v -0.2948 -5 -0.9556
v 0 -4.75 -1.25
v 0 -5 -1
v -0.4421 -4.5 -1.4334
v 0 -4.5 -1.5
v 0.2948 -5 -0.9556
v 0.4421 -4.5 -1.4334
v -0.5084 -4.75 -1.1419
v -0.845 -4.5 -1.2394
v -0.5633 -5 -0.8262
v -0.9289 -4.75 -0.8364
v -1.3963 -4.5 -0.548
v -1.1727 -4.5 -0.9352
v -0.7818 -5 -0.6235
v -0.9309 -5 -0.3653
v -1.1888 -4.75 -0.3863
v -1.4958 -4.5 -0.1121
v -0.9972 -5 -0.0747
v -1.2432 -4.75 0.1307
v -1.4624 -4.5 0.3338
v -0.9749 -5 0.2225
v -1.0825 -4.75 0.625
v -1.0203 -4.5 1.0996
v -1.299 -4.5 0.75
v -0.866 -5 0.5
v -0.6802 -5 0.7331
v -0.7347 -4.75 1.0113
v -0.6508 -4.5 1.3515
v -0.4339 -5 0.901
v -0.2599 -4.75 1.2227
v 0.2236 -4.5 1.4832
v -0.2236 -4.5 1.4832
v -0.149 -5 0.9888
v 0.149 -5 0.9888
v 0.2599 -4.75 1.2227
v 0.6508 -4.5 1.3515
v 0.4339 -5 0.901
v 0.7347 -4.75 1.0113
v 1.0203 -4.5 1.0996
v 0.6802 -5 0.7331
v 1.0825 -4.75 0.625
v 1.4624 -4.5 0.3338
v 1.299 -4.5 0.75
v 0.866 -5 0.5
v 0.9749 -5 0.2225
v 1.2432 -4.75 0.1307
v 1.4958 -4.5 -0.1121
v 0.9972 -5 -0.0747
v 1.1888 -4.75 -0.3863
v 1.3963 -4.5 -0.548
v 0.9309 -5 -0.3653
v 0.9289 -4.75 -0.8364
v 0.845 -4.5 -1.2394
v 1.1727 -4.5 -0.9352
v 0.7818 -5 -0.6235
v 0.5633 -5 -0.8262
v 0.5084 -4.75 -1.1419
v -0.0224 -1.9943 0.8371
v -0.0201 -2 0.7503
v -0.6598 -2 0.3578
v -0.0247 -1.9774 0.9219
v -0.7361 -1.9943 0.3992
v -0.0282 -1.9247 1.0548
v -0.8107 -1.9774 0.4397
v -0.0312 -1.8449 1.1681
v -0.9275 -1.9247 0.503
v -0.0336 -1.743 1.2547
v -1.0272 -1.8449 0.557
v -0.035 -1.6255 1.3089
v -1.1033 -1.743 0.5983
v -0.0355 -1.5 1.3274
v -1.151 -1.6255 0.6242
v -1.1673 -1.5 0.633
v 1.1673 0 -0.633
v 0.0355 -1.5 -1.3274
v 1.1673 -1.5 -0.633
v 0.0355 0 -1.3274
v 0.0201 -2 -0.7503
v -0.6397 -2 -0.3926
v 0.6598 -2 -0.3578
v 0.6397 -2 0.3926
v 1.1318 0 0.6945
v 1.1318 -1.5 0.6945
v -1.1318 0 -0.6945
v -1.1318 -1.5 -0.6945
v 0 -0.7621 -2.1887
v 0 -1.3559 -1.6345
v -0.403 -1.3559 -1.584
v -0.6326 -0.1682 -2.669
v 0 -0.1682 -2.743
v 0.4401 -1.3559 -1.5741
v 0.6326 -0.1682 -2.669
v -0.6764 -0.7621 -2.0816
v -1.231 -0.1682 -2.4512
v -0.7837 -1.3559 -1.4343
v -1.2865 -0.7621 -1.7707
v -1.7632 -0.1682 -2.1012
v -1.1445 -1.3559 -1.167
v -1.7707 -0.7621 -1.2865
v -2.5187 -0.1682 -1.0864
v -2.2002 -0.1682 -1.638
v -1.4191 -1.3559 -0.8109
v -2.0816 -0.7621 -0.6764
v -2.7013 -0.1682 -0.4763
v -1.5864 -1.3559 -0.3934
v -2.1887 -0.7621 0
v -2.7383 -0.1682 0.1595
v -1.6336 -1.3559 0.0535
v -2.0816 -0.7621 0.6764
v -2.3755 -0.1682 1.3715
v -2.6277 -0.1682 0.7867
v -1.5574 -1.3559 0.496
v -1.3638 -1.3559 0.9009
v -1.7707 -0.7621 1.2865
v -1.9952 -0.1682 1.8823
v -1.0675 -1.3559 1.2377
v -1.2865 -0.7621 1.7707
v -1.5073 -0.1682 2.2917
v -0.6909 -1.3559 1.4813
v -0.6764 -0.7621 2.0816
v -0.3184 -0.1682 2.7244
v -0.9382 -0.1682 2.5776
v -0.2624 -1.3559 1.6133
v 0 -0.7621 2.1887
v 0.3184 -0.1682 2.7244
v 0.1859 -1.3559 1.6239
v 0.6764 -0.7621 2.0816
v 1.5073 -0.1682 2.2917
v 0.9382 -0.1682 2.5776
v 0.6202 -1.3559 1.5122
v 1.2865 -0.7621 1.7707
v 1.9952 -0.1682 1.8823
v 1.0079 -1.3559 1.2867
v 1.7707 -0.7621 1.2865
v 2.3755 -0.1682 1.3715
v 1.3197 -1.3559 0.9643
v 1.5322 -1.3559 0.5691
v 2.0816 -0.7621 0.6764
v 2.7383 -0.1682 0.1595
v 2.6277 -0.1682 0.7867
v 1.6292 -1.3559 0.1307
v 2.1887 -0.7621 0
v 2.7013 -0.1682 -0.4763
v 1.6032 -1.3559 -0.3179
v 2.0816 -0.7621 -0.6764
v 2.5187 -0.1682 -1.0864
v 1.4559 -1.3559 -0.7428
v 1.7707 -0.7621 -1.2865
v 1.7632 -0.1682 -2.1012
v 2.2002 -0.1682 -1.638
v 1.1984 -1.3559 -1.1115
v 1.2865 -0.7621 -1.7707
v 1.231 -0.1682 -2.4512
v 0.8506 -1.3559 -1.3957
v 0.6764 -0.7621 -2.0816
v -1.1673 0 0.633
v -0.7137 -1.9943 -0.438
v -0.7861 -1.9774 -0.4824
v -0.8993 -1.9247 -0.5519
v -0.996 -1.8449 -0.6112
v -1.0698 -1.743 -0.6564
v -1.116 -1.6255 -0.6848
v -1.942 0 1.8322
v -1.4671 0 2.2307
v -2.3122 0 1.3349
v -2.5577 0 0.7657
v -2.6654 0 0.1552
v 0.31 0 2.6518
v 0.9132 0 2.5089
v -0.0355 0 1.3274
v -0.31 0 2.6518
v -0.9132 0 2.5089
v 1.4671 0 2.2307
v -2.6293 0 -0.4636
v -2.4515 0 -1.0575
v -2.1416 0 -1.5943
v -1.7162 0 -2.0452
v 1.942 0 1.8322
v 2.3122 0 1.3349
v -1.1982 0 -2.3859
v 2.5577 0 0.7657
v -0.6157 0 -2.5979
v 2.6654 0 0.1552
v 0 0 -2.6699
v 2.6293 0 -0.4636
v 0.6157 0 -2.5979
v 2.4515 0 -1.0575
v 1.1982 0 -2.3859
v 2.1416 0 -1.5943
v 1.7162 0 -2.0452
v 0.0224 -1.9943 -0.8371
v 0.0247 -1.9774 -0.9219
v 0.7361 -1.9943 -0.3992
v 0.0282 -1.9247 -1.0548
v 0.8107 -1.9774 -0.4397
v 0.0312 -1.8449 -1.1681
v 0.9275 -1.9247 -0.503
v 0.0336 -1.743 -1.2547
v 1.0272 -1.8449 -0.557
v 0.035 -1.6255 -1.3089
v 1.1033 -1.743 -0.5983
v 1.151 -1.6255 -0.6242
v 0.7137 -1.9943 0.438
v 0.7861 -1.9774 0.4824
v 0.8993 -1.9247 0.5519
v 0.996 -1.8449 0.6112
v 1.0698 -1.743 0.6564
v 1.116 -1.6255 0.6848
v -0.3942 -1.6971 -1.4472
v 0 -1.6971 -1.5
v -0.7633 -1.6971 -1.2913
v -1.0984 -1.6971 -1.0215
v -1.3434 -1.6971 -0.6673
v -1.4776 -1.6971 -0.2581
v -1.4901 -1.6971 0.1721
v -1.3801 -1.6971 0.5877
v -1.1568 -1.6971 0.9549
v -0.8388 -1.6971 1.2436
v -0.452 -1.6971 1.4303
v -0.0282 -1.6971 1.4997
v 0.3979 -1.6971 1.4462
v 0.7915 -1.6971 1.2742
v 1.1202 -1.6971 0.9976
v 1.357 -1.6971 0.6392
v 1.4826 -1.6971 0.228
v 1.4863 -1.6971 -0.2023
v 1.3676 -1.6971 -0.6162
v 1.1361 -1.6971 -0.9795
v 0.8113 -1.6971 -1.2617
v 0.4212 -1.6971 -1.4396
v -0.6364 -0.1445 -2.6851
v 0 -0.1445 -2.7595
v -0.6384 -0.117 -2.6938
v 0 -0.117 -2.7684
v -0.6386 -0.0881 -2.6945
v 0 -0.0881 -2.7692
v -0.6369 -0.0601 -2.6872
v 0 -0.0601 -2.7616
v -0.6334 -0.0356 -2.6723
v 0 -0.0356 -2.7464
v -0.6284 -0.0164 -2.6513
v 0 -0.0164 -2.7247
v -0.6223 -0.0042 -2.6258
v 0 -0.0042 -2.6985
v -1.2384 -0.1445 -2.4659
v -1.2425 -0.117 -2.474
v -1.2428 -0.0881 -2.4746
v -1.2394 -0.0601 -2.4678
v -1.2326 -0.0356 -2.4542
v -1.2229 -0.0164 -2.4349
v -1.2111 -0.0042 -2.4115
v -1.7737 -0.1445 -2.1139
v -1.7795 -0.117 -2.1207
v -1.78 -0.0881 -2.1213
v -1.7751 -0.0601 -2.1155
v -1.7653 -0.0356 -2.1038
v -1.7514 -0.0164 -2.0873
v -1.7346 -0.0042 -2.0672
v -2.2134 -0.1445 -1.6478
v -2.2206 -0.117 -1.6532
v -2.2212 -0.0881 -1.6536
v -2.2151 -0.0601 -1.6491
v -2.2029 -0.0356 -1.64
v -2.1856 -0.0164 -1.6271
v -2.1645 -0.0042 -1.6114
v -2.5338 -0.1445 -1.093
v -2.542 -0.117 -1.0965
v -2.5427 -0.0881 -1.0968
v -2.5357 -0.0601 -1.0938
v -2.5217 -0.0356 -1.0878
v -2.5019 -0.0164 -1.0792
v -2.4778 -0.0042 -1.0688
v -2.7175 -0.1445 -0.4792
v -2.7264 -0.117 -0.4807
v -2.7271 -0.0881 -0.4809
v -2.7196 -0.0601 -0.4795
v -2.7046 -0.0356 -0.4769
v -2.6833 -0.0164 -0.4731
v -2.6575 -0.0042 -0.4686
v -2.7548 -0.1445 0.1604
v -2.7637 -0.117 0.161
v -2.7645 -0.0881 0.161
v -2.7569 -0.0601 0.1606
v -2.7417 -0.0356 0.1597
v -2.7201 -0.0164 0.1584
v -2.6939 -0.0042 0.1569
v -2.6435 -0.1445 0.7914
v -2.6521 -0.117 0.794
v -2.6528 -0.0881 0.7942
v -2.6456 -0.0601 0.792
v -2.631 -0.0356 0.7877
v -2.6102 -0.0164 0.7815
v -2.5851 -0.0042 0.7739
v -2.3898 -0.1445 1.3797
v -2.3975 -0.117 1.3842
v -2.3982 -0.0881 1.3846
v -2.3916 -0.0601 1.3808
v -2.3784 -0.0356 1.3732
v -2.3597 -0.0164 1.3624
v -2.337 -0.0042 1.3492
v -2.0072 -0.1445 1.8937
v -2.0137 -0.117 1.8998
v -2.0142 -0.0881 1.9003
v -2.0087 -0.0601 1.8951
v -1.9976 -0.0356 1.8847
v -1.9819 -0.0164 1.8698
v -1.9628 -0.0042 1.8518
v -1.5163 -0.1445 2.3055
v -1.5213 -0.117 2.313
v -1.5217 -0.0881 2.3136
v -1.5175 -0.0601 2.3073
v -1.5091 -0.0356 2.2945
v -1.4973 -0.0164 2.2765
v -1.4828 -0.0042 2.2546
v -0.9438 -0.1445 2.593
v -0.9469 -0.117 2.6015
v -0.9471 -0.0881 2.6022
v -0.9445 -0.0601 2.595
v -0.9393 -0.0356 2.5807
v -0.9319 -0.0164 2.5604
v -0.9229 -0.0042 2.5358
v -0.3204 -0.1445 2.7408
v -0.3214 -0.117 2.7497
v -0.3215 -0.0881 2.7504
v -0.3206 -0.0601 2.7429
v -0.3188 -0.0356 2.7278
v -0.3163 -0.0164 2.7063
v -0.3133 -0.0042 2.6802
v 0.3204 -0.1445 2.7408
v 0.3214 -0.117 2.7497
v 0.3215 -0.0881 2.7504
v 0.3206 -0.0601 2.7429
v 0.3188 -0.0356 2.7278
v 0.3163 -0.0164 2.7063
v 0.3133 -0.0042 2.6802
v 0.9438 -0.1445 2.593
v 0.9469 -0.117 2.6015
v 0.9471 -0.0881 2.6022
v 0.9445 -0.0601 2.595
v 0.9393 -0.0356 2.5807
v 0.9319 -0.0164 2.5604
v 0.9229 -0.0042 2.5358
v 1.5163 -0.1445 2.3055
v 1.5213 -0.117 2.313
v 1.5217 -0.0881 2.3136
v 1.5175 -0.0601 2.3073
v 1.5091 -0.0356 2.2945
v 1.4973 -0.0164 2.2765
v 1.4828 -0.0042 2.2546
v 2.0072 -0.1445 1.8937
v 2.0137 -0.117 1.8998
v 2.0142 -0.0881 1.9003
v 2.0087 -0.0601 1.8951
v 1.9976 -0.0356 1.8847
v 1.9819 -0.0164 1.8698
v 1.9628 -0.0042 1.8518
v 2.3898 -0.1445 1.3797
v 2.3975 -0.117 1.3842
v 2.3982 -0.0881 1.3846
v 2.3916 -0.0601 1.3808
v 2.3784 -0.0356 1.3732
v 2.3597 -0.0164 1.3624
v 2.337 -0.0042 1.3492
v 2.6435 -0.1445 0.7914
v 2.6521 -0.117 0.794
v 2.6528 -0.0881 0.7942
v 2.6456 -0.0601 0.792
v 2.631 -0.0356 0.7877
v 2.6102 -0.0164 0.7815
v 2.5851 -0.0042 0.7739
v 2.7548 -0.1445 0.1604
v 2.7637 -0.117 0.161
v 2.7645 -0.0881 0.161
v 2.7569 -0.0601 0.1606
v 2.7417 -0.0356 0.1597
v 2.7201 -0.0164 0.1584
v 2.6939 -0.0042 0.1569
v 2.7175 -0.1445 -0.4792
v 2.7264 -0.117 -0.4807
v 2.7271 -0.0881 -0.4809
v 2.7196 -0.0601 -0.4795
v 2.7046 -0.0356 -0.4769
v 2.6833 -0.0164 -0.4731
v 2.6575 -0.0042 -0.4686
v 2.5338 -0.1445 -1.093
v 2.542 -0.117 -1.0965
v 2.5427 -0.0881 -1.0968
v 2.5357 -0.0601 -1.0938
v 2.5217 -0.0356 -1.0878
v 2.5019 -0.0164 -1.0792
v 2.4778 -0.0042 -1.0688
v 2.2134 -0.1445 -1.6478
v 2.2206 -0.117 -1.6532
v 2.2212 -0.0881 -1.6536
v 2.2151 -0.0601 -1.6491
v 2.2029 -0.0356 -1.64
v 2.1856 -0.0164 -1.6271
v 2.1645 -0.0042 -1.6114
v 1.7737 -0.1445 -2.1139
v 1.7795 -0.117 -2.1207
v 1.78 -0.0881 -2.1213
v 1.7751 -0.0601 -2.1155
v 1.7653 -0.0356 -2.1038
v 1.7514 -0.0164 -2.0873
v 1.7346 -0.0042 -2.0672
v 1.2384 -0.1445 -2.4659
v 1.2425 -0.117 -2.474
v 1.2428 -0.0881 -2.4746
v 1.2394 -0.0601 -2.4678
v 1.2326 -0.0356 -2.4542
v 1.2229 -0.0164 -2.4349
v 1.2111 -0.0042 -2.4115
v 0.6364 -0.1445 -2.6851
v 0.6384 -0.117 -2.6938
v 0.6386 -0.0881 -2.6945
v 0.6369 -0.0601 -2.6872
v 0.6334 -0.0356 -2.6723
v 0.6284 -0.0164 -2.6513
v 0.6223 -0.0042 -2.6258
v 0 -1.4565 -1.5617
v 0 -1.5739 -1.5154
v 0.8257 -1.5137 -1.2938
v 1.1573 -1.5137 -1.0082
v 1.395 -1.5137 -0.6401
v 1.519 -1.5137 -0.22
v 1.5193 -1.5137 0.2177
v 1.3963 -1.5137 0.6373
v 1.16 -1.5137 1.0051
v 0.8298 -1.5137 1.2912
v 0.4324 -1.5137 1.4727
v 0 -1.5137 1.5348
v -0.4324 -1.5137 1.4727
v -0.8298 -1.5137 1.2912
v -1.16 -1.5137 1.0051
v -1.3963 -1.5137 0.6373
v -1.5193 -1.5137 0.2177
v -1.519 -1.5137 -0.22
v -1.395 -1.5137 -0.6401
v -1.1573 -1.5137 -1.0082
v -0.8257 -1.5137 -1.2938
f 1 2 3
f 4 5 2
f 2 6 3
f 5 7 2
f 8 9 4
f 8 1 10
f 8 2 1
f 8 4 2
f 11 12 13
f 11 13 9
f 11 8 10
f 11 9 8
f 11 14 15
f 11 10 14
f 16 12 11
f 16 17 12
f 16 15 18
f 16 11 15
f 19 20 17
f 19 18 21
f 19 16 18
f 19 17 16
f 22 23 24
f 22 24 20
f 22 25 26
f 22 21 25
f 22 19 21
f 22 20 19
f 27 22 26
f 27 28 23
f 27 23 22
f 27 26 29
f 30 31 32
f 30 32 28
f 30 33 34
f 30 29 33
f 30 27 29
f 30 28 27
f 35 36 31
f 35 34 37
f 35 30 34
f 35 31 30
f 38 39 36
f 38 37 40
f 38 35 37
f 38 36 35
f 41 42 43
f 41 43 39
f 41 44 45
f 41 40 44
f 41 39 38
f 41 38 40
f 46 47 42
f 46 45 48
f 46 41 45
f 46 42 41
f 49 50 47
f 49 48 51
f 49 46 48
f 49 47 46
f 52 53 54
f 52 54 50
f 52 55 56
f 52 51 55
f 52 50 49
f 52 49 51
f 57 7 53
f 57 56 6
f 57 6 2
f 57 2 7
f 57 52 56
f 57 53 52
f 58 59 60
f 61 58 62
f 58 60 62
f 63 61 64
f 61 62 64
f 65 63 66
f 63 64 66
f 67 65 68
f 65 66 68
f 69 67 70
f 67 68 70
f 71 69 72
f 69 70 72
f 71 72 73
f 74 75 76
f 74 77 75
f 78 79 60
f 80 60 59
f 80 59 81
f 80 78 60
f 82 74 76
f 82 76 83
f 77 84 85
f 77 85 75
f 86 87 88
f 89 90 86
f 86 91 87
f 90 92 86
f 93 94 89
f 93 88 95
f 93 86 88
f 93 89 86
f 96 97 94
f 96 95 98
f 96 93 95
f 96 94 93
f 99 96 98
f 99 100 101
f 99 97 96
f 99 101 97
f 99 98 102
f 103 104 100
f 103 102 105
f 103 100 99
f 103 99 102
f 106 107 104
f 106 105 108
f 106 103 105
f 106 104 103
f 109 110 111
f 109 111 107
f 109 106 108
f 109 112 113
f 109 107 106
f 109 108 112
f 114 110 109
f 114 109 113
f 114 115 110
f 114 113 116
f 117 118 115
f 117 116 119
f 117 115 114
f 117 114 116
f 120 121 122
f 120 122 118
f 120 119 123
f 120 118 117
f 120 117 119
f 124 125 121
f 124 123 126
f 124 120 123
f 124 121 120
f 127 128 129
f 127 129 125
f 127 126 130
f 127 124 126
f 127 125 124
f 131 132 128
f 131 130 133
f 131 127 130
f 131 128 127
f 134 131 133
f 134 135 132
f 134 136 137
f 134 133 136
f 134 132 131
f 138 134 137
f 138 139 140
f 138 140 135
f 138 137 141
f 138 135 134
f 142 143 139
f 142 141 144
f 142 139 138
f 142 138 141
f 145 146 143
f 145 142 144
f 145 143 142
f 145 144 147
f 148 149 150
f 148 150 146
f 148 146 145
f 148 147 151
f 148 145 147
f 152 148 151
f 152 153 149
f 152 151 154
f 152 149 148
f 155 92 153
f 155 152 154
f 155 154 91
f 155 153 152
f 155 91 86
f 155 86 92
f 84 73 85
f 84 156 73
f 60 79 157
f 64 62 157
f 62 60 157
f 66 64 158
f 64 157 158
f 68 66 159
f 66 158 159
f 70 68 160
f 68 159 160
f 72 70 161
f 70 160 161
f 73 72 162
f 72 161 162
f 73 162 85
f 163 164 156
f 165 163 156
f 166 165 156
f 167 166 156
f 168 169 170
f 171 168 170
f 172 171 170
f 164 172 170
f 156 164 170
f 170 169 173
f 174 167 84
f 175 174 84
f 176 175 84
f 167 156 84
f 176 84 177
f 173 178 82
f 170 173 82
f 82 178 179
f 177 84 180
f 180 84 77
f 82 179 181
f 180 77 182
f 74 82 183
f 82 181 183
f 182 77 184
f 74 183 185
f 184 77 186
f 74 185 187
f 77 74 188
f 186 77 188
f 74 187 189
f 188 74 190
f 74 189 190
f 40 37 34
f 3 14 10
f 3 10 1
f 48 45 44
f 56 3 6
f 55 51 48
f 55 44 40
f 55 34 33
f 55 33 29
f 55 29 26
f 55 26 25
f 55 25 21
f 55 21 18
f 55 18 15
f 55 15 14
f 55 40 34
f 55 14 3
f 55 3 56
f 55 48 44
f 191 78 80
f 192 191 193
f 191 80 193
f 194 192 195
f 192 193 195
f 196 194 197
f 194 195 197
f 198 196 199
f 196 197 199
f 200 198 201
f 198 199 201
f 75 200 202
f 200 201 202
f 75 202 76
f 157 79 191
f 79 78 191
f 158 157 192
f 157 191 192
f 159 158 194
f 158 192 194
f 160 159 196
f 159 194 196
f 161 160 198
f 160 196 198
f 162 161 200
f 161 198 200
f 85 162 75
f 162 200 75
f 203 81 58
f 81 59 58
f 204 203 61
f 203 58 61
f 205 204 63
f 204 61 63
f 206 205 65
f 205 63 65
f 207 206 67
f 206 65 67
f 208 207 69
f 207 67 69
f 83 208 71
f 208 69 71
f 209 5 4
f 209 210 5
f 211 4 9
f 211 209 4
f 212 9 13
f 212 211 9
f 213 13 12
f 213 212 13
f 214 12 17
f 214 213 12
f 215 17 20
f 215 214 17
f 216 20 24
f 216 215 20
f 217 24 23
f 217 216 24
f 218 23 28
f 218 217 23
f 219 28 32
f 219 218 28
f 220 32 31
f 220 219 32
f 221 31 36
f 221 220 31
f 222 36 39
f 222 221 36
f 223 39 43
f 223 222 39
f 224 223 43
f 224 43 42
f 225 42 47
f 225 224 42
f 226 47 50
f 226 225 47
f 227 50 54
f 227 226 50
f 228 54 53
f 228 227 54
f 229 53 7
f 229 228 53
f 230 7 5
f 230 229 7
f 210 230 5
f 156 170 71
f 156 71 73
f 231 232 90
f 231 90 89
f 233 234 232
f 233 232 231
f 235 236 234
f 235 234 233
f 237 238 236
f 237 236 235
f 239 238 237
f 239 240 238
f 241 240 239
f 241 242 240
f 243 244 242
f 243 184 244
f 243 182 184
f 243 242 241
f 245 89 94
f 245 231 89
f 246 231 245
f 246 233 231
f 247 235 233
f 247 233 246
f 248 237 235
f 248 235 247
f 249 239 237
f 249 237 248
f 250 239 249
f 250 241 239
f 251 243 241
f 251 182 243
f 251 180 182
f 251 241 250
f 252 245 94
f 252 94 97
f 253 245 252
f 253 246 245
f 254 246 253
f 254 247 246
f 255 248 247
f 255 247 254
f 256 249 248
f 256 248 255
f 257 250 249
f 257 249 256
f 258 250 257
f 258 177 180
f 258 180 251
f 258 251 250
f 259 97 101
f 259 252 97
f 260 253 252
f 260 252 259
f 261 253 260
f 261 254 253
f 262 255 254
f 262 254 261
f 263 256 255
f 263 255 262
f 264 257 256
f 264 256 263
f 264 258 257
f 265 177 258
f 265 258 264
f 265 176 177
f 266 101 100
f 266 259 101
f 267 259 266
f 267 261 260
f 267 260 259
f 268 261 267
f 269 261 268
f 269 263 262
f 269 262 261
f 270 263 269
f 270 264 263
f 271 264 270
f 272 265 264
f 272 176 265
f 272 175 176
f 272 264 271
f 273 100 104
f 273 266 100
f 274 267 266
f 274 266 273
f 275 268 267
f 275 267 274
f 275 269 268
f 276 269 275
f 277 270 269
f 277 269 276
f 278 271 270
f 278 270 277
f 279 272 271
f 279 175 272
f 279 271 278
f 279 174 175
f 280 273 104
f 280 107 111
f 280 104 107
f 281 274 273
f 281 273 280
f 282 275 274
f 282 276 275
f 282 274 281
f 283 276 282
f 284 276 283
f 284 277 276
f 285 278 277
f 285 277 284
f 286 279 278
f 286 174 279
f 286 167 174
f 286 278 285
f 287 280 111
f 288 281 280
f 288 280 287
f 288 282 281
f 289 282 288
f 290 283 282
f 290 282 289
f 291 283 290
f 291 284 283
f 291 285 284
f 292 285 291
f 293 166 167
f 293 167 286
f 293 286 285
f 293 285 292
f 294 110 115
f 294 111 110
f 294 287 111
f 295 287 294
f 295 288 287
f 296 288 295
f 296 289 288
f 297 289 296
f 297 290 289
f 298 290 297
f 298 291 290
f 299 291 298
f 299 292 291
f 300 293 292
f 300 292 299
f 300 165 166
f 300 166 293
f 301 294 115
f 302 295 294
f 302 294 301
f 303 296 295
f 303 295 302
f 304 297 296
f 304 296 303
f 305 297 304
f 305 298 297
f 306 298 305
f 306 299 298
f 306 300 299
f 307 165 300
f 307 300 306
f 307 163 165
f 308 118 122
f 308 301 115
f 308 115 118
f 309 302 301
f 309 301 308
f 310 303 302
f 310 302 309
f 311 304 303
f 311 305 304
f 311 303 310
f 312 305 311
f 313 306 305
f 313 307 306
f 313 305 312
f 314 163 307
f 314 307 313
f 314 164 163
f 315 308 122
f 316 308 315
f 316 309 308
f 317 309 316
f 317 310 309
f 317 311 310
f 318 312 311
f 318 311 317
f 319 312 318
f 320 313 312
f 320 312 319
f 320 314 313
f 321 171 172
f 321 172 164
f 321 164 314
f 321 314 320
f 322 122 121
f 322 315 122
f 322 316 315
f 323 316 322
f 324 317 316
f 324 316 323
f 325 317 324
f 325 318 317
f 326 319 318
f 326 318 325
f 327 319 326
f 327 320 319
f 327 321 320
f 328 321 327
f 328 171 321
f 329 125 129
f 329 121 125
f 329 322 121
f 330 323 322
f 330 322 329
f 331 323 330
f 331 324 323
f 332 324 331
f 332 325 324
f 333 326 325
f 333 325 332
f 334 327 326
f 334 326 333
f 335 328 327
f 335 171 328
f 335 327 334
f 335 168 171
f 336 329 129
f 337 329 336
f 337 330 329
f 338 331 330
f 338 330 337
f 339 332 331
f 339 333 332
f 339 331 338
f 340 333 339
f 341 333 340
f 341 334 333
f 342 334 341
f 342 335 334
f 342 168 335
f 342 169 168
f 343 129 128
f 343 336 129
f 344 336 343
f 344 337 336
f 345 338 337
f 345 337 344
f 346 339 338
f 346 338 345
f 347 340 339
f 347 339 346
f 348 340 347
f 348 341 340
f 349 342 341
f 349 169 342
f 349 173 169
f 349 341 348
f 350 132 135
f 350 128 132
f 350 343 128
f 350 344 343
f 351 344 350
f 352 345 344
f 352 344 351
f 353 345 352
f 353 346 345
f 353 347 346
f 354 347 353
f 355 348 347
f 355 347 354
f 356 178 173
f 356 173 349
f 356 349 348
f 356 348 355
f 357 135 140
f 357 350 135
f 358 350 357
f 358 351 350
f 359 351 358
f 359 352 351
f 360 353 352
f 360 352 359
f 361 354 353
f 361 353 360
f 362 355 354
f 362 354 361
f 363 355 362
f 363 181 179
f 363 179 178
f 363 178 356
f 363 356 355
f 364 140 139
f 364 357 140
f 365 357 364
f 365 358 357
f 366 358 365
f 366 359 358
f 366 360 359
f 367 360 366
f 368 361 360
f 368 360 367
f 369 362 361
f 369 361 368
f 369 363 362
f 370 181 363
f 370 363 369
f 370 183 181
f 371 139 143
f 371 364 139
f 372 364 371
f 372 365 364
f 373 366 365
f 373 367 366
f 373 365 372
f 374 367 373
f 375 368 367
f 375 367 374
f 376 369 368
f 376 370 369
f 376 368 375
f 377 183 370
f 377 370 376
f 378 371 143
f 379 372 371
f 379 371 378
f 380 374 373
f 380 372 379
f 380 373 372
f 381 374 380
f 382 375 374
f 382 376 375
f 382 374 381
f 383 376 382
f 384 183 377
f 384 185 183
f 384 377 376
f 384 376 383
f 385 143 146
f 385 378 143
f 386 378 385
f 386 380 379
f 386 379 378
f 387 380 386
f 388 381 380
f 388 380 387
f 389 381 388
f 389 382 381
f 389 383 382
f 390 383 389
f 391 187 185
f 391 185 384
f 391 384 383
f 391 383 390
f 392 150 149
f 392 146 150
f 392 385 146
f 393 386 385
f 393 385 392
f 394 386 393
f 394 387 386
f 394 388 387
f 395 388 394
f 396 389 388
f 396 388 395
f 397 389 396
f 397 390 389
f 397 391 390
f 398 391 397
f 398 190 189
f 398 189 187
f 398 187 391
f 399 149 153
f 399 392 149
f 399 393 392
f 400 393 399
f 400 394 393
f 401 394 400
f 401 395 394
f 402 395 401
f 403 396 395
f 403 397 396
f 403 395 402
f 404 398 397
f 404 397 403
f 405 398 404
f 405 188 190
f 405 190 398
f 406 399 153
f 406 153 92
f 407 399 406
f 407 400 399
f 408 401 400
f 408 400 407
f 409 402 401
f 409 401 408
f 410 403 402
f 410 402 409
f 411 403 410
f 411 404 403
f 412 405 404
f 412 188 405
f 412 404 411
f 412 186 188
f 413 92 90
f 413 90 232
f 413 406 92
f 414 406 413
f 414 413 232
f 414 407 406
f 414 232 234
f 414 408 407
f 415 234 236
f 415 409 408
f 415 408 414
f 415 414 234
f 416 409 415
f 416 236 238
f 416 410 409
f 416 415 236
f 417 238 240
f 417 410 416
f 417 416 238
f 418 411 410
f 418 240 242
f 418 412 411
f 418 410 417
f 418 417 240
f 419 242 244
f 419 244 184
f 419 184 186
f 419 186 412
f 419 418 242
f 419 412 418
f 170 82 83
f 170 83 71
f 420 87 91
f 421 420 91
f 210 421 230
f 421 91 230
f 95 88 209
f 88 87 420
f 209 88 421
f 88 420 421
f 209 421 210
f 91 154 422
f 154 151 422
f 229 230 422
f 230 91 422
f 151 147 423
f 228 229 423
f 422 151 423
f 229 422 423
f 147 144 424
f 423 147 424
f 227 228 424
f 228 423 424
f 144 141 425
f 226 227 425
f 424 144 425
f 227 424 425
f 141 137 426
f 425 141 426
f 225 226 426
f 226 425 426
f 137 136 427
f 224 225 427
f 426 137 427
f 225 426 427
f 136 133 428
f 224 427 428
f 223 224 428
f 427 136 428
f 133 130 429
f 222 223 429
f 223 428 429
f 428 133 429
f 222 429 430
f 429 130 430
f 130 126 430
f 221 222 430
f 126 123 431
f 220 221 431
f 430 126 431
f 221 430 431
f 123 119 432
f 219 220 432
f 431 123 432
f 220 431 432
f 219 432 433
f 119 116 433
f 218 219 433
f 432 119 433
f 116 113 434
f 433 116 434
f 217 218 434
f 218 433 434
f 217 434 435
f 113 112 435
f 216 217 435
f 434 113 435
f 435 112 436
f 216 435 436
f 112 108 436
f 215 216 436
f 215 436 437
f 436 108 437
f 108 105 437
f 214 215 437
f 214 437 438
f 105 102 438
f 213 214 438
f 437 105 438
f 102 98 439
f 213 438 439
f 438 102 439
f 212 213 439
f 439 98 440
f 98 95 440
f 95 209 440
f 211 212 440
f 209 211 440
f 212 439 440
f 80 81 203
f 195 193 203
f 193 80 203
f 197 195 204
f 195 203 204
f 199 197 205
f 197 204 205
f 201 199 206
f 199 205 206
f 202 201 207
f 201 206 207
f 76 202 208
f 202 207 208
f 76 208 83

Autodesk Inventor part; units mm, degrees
ref_plane "YZ Plane" through (0, 0, 0) normal (1, 0, 0) x (0, 1, 0)
ref_plane "XZ Plane" through (0, 0, 0) normal (0, 1, 0) x (-1, 0, 0)
ref_plane "XY Plane" through (0, 0, 0) normal (0, 0, 1) x (1, 0, 0)
sketch "Szkic2" plane through (0, 0, 0) normal (1, 0, 0) x (0, 1, 0)
  line L0 (0, -2.9) -> (0, 2.9)
  line L1 (-1.5, -1.5) -> (-1.5, 1.5)
  line L2 (-1.5, -1.5) -> (0, -2.9)
  line L3 (-1.5, 1.5) -> (0, 2.9)
  line L4 (0, 0) -> (-5, 0)
  line L5 (-5, 0) -> (-5, -1.5)
  line L6 (-5, -1.5) -> (-1.5, -1.5)
  dimension "d0" = 5.8
  dimension "d2" = 3
  dimension "d3" = 1.5
  dimension "d4" = 5
  dimension "d5" = 1.5
revolve "Obrót1" add sketch "Szkic2" angle 360 about axis through (0, 0, 0) along (0, -1, 0) contours L2 L1 L4 L0 | L6 L5 L4 L1
sketch "Szkic3" plane through (0, 0, 0) normal (0, 1, 0) x (1, 0, 0)
  line L0 (-1.1673, -0.633) -> (-1.1318, 0.6945)
  line L1 (-1.1318, 0.6945) -> (0.0355, 1.3274)
  line L2 (0.0355, 1.3274) -> (1.1673, 0.633)
  line L3 (1.1673, 0.633) -> (1.1318, -0.6945)
  line L4 (1.1318, -0.6945) -> (-0.0355, -1.3274)
  line L5 (-0.0355, -1.3274) -> (-1.1673, -0.633)
  point P0 (0, 0)
  point P1 (0, 0)
  dimension "d7" = 2.3
extrude "Wyciągnięcie proste1" cut sketch "Szkic3" against normal blind 2
fillet "Zaokrąglenie1" radius 0.5 6 edges at (-1.1496, -2, -0.0308) (-0.6014, -2, 0.9802) (-0.5482, -2, -1.011) (0.6014, -2, -0.9802) (0.5482, -2, 1.011) (1.1496, -2, 0.0308)
fillet "Zaokrąglenie2" radius 0.5 1 edges at (0, -1.5, 1.5)
fillet "Zaokrąglenie3" radius 0.1 1 edges at (0, 0, 2.9)
thread "Gwint1" size "M3x0.5" class "6g" standard "ANSI Metric M Profile" full length
chamfer "Faza1" distance 0.5 angle 45 1 edges at (0, -5, 1.5)
properties part number "Screw M3 5mm flat head"
